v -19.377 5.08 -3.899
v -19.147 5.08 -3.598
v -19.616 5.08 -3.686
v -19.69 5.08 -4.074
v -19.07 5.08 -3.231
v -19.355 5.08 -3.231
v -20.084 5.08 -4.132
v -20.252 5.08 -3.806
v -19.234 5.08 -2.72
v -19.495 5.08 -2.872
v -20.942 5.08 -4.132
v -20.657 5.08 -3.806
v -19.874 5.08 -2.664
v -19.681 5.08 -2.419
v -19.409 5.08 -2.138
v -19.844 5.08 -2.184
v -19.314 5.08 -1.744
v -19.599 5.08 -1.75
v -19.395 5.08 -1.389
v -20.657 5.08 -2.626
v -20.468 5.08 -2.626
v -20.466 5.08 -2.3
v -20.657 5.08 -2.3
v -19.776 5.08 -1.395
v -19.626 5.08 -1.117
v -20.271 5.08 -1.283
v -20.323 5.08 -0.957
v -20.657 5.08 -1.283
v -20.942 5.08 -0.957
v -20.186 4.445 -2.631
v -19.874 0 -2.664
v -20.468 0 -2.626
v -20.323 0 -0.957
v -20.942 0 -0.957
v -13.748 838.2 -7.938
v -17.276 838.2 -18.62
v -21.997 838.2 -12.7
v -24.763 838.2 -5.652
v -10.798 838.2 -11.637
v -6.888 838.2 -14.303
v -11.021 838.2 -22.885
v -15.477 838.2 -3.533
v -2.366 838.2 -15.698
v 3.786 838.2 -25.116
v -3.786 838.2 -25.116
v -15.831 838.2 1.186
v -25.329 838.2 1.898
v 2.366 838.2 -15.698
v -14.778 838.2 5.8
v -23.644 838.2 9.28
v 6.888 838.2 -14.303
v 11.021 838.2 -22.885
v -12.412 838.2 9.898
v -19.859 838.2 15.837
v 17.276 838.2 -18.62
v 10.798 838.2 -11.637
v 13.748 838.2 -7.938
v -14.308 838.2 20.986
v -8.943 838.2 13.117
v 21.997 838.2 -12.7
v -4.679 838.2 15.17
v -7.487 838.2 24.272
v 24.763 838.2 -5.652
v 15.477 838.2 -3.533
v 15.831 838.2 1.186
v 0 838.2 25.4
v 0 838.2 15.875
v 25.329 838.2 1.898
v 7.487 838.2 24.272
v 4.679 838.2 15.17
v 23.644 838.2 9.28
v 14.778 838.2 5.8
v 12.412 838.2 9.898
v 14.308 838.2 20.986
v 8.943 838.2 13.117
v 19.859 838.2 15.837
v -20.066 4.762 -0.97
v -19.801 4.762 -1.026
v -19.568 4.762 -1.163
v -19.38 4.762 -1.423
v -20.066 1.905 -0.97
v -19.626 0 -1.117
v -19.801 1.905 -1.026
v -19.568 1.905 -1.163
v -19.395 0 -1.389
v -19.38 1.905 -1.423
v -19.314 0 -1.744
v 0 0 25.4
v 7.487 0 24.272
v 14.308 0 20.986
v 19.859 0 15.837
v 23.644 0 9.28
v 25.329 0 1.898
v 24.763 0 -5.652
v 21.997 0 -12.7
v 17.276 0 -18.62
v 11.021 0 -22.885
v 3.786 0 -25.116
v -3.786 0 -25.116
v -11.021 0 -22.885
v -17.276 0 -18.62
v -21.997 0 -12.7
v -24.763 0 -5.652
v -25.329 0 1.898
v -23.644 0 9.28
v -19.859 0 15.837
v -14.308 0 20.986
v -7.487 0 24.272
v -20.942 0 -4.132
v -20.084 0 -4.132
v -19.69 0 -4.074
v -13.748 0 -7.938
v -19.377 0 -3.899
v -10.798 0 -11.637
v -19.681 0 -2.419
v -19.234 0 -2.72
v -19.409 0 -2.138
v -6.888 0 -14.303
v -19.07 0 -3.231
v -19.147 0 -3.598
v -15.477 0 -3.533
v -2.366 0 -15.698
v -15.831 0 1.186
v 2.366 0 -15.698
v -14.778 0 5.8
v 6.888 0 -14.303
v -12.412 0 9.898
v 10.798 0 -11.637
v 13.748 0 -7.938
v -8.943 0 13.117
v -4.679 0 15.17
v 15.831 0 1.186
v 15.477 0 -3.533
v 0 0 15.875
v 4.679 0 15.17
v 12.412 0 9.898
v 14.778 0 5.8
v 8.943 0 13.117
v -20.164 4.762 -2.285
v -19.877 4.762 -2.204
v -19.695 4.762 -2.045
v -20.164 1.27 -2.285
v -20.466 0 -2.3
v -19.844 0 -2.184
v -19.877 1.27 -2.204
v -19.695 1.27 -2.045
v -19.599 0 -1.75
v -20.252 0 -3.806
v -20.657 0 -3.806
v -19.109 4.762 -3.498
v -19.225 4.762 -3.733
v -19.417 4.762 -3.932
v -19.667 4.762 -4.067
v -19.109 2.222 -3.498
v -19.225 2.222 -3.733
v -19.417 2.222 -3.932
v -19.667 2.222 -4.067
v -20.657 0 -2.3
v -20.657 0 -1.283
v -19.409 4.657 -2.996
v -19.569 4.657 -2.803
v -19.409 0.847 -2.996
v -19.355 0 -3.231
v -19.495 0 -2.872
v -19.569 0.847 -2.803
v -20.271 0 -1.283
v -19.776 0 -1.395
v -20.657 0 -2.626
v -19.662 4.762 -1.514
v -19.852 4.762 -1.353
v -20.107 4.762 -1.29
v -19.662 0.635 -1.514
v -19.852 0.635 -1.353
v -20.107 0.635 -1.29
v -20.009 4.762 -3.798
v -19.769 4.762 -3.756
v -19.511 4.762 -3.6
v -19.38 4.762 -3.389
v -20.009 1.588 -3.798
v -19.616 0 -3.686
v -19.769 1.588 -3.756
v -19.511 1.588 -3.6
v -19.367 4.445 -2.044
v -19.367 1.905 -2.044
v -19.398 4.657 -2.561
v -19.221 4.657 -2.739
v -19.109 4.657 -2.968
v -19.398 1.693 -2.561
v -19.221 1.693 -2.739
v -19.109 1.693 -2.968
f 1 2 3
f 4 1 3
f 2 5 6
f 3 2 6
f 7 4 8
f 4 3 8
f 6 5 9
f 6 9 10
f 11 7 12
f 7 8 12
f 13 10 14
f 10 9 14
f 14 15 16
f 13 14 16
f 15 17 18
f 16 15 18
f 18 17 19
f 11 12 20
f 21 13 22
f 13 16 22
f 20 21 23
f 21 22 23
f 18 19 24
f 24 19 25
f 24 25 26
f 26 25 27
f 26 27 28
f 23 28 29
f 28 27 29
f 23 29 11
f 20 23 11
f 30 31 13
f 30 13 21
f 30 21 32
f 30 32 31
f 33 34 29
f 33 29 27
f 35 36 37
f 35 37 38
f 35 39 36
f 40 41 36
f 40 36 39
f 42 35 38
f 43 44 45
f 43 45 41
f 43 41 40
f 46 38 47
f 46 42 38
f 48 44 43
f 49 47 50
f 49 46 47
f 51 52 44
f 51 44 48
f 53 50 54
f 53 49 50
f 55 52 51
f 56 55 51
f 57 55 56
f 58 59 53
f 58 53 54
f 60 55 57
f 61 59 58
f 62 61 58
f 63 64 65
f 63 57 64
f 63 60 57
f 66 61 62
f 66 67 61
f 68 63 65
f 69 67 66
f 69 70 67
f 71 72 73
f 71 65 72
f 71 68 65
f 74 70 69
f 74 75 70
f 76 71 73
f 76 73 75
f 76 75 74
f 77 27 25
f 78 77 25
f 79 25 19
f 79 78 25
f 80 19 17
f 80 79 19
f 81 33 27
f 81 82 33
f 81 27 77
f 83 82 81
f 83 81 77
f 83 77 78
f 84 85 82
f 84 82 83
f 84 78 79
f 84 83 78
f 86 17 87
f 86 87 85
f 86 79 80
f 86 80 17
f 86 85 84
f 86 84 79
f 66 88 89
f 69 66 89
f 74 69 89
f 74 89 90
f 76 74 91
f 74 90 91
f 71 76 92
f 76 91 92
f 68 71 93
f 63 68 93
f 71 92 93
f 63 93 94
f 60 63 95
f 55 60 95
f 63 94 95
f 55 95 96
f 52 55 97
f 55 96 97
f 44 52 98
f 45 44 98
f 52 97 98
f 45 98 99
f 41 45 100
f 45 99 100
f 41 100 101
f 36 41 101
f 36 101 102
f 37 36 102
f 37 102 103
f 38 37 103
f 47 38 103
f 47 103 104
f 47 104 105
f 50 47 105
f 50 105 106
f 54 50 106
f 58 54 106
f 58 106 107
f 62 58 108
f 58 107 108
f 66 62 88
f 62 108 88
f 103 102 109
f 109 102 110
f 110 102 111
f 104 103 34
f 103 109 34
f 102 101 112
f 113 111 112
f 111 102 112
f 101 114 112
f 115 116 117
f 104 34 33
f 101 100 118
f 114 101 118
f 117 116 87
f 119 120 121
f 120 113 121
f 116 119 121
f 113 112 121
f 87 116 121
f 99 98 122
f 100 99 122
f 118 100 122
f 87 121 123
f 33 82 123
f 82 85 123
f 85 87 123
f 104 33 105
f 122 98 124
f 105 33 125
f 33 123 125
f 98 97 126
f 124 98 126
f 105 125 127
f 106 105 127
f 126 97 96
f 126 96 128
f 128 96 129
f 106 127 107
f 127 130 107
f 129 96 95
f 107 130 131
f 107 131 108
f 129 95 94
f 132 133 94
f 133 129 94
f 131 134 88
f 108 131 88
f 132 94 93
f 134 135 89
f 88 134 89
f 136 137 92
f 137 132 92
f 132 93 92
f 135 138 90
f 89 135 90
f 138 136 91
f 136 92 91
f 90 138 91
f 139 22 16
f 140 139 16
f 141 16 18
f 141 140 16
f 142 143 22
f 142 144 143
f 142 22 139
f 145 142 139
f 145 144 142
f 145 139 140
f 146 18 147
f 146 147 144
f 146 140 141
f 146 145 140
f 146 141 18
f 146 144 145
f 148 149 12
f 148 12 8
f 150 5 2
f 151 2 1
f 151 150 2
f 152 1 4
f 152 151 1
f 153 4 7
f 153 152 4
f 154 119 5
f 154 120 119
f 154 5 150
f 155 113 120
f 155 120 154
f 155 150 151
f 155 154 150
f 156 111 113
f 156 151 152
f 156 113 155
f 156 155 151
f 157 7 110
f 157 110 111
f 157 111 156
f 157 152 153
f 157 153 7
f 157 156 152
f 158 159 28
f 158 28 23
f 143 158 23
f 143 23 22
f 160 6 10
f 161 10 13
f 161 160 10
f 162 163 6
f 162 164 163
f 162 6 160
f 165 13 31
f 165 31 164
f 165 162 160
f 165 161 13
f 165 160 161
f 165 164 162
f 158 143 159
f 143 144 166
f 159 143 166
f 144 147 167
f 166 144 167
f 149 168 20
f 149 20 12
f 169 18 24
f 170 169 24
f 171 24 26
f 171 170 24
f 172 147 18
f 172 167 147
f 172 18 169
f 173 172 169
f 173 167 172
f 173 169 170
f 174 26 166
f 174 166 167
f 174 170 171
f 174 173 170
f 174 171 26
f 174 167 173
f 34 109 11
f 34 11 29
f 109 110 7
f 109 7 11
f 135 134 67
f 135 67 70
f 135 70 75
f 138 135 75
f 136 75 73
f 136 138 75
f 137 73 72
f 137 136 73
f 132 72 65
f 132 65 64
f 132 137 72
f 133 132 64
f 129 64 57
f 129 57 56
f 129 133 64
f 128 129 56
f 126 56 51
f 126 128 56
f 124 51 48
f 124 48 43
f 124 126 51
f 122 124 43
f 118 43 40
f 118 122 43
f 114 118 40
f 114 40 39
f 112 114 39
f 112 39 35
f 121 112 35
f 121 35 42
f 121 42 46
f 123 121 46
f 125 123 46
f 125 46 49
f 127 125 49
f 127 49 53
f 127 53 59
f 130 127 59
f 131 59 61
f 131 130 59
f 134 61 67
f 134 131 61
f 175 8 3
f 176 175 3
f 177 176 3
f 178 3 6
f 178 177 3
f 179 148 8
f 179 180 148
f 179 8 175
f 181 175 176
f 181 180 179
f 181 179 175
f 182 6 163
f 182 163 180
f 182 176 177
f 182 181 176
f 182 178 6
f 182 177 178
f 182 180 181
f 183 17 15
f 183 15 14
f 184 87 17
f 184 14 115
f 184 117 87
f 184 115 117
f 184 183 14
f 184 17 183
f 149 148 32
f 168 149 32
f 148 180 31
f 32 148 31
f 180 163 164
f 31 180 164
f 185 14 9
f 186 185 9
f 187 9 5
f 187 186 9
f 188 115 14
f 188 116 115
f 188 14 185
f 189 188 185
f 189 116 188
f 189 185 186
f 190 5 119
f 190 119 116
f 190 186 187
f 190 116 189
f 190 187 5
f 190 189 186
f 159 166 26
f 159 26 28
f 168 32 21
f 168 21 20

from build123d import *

# Parameters (mm, degrees)
SKETCH1_R           = 25.4
SKETCH1_R_2         = 15.875
BOSS_EXTRUDE1_DEPTH = 838.2
CUT_EXTRUDE3_DEPTH  = 5.08


with BuildPart() as part:
    # Sketch1 → Boss-Extrude1 (new body)
    with BuildSketch(Plane(origin=(0, 0, 0), x_dir=(1, 0, 0), z_dir=(0, 1, 0))):
        with Locations(Location((0, 0, 0), (0, 0, 270))):
            Circle(SKETCH1_R)
        with Locations(Location((0, 0, 0), (0, 0, 270))):
            Circle(SKETCH1_R_2, mode=Mode.SUBTRACT)
    extrude(amount=BOSS_EXTRUDE1_DEPTH)

    # Sketch5 → Cut-Extrude3 (cut)
    with BuildSketch(Plane.XZ):
        with BuildLine():
            Line((-20.9422761, -0.95712788), (-20.322794931, -0.95712788))
            add(Edge.make_bspline(
                [(-20.322794931, -0.95712788), (-20.292470525, -0.957287311), (-20.233694281, -0.957596328), (-20.148223787, -0.962388882), (-20.068169509, -0.96892364), (-19.99350823, -0.979292367), (-19.92427445, -0.991803479), (-19.860259522, -1.006954412), (-19.801667008, -1.025121412), (-19.73171474, -1.054010538), (-19.651958141, -1.096939412), (-19.565599599, -1.160374611), (-19.491754325, -1.237964774), (-19.428085308, -1.325488325), (-19.377465721, -1.421768633), (-19.340845001, -1.524510897), (-19.317660357, -1.632389906), (-19.315275992, -1.706451931), (-19.314070972, -1.743881687)],
                knots=[0, 0, 0, 0, 1.001505555, 1.941167018, 2.826882275, 3.653841531, 4.429895133, 5.150066043, 5.825578002, 6.45369114, 7.647487171, 8.808567382, 9.977351308, 11.170798116, 12.373658725, 13.556498008, 14.765093433, 16, 16, 16, 16], degree=3))
            add(Edge.make_bspline(
                [(-19.314070972, -1.743881687), (-19.315062678, -1.778945076), (-19.317011472, -1.847847944), (-19.335646689, -1.948626172), (-19.36482101, -2.044557634), (-19.405375057, -2.135292227), (-19.458081868, -2.218779862), (-19.5205462, -2.295694024), (-19.595908728, -2.362778198), (-19.652372239, -2.400282116), (-19.681053144, -2.419332408)],
                knots=[0, 0, 0, 0, 1.044552857, 2.05264487, 3.044412934, 4.028983338, 5.005914585, 5.980388656, 6.974128949, 8, 8, 8, 8], degree=3))
            add(Edge.make_bspline(
                [(-19.681053144, -2.419332408), (-19.644984756, -2.433179942), (-19.575976995, -2.459673707), (-19.481011827, -2.506514449), (-19.399192217, -2.557461506), (-19.329889092, -2.613098256), (-19.270618505, -2.673068392), (-19.218863336, -2.738251245), (-19.174702376, -2.809497119), (-19.136862795, -2.886063183), (-19.107336423, -2.967167622), (-19.085223996, -3.052049683), (-19.072553524, -3.140404994), (-19.07075045, -3.200535302), (-19.069840203, -3.230890901)],
                knots=[0, 0, 0, 0, 1.27268992, 2.434971085, 3.483601985, 4.442670788, 5.356604649, 6.2567628, 7.179492994, 8.113709626, 9.066344395, 10.018646069, 10.999752585, 12, 12, 12, 12], degree=3))
            add(Edge.make_bspline(
                [(-19.069840203, -3.230890901), (-19.070726342, -3.261885135), (-19.072469845, -3.322867159), (-19.085333105, -3.412452174), (-19.107112795, -3.498063733), (-19.137113049, -3.580255577), (-19.176267435, -3.658868699), (-19.223917802, -3.73399216), (-19.280733578, -3.80487116), (-19.344290609, -3.872293304), (-19.416192698, -3.932915654), (-19.493767704, -3.986904902), (-19.57799258, -4.031305972), (-19.667484032, -4.068604078), (-19.763245947, -4.097094893), (-19.864848313, -4.117027157), (-19.972203501, -4.13045744), (-20.045872346, -4.131561619), (-20.083652302, -4.13212788)],
                knots=[0, 0, 0, 0, 0.978564426, 1.925352924, 2.850884081, 3.763762016, 4.682927383, 5.618979971, 6.567305752, 7.547517671, 8.540179244, 9.531824382, 10.526200242, 11.540722885, 12.589160233, 13.674978461, 14.80764778, 16, 16, 16, 16], degree=3))
            Line((-20.083652302, -4.13212788), (-20.9422761, -4.13212788))
            Line((-20.9422761, -4.13212788), (-20.9422761, -0.95712788))
        make_face()
        with BuildLine():
            Line((-20.657340203, -1.282768906), (-20.657340203, -2.300397111))
            Line((-20.657340203, -2.300397111), (-20.465898897, -2.300397111))
            add(Edge.make_bspline(
                [(-20.465898897, -2.300397111), (-20.437914633, -2.300034324), (-20.383843331, -2.299333345), (-20.305538853, -2.297325369), (-20.232854015, -2.291702858), (-20.165914281, -2.286081963), (-20.104825064, -2.276942873), (-20.049721704, -2.266064304), (-19.999739405, -2.254559097), (-19.94209996, -2.234992491), (-19.8767195, -2.206074886), (-19.807020898, -2.161196863), (-19.745576058, -2.107744057), (-19.693690038, -2.046066542), (-19.651225347, -1.978152216), (-19.621730762, -1.905084689), (-19.601730726, -1.828684998), (-19.599924123, -1.776235583), (-19.59900687, -1.749605845)],
                knots=[0, 0, 0, 0, 1.156816544, 2.235205308, 3.236616184, 4.169592532, 5.011045266, 5.787822928, 6.49130361, 7.128639758, 8.301311294, 9.436451833, 10.541879658, 11.654887649, 12.756523258, 13.837046038, 14.901820046, 16, 16, 16, 16], degree=3))
            add(Edge.make_bspline(
                [(-19.59900687, -1.749605845), (-19.59948419, -1.731983895), (-19.600420507, -1.697416516), (-19.60808886, -1.647025317), (-19.621122302, -1.59963277), (-19.637862983, -1.554589398), (-19.661257007, -1.513303648), (-19.688801006, -1.474348035), (-19.722080168, -1.439049185), (-19.759960016, -1.406056854), (-19.803510695, -1.376806461), (-19.852706224, -1.351188054), (-19.908212189, -1.330558921), (-19.969093136, -1.312492126), (-20.036286194, -1.299802745), (-20.109015967, -1.289231458), (-20.187878176, -1.283849613), (-20.242438377, -1.283137177), (-20.270641485, -1.282768906)],
                knots=[0, 0, 0, 0, 0.91205012, 1.789085906, 2.630437955, 3.453916878, 4.269457761, 5.079663411, 5.91843418, 6.774407191, 7.675494373, 8.627863946, 9.638891023, 10.736472738, 11.911756761, 13.175263542, 14.539845004, 16, 16, 16, 16], degree=3))
            Line((-20.270641485, -1.282768906), (-20.657340203, -1.282768906))
        make_face(mode=Mode.SUBTRACT)
        with BuildLine():
            Line((-20.657340203, -2.626038137), (-20.657340203, -3.806486855))
            Line((-20.657340203, -3.806486855), (-20.251560956, -3.806486855))
            add(Edge.make_bspline(
                [(-20.251560956, -3.806486855), (-20.222515216, -3.806138741), (-20.166533382, -3.805467798), (-20.085705837, -3.803277452), (-20.010791164, -3.798295173), (-19.942131213, -3.790452152), (-19.878984588, -3.781944559), (-19.822108814, -3.770504326), (-19.771042846, -3.757397055), (-19.711829724, -3.73713677), (-19.645151542, -3.705662114), (-19.573295979, -3.658205637), (-19.509409338, -3.601669494), (-19.455157425, -3.53623645), (-19.410695642, -3.465088032), (-19.378351051, -3.389663322), (-19.358402202, -3.311208593), (-19.355987234, -3.257717361), (-19.3547761, -3.230890901)],
                knots=[0, 0, 0, 0, 1.160039823, 2.235823828, 3.228722157, 4.157150951, 4.99529583, 5.772374946, 6.472645482, 7.099169577, 8.269452708, 9.405989375, 10.527446681, 11.663510218, 12.788923519, 13.866172445, 14.929861265, 16, 16, 16, 16], degree=3))
            add(Edge.make_bspline(
                [(-19.3547761, -3.230890901), (-19.355026567, -3.2141148), (-19.355523459, -3.180833196), (-19.363017016, -3.131923846), (-19.373915313, -3.084547518), (-19.388004542, -3.038575568), (-19.40852363, -2.994839148), (-19.432478139, -2.952473254), (-19.460564553, -2.911421884), (-19.504328903, -2.859522197), (-19.567984918, -2.799726049), (-19.658433207, -2.741181315), (-19.761278077, -2.693966519), (-19.83587016, -2.673919136), (-19.874402503, -2.663563177)],
                knots=[0, 0, 0, 0, 0.723448775, 1.435228256, 2.130040452, 2.821711965, 3.505591119, 4.210454504, 4.921174351, 5.648778258, 7.137944449, 8.670945889, 10.280296675, 12, 12, 12, 12], degree=3))
            add(Edge.make_bspline(
                [(-19.874402503, -2.663563177), (-19.889850325, -2.660428922), (-19.923344391, -2.653633211), (-19.977961268, -2.646459795), (-20.04031452, -2.640068919), (-20.11054813, -2.635341655), (-20.188750958, -2.63045529), (-20.27509002, -2.628554988), (-20.369212726, -2.626287802), (-20.434520093, -2.626123488), (-20.468442967, -2.626038137)],
                knots=[0, 0, 0, 0, 0.634451884, 1.375622551, 2.216452059, 3.157844607, 4.20941857, 5.370758133, 6.634282058, 8, 8, 8, 8], degree=3))
            Line((-20.468442967, -2.626038137), (-20.657340203, -2.626038137))
        make_face(mode=Mode.SUBTRACT)
    extrude(amount=-CUT_EXTRUDE3_DEPTH, mode=Mode.SUBTRACT)


solid = part.part
